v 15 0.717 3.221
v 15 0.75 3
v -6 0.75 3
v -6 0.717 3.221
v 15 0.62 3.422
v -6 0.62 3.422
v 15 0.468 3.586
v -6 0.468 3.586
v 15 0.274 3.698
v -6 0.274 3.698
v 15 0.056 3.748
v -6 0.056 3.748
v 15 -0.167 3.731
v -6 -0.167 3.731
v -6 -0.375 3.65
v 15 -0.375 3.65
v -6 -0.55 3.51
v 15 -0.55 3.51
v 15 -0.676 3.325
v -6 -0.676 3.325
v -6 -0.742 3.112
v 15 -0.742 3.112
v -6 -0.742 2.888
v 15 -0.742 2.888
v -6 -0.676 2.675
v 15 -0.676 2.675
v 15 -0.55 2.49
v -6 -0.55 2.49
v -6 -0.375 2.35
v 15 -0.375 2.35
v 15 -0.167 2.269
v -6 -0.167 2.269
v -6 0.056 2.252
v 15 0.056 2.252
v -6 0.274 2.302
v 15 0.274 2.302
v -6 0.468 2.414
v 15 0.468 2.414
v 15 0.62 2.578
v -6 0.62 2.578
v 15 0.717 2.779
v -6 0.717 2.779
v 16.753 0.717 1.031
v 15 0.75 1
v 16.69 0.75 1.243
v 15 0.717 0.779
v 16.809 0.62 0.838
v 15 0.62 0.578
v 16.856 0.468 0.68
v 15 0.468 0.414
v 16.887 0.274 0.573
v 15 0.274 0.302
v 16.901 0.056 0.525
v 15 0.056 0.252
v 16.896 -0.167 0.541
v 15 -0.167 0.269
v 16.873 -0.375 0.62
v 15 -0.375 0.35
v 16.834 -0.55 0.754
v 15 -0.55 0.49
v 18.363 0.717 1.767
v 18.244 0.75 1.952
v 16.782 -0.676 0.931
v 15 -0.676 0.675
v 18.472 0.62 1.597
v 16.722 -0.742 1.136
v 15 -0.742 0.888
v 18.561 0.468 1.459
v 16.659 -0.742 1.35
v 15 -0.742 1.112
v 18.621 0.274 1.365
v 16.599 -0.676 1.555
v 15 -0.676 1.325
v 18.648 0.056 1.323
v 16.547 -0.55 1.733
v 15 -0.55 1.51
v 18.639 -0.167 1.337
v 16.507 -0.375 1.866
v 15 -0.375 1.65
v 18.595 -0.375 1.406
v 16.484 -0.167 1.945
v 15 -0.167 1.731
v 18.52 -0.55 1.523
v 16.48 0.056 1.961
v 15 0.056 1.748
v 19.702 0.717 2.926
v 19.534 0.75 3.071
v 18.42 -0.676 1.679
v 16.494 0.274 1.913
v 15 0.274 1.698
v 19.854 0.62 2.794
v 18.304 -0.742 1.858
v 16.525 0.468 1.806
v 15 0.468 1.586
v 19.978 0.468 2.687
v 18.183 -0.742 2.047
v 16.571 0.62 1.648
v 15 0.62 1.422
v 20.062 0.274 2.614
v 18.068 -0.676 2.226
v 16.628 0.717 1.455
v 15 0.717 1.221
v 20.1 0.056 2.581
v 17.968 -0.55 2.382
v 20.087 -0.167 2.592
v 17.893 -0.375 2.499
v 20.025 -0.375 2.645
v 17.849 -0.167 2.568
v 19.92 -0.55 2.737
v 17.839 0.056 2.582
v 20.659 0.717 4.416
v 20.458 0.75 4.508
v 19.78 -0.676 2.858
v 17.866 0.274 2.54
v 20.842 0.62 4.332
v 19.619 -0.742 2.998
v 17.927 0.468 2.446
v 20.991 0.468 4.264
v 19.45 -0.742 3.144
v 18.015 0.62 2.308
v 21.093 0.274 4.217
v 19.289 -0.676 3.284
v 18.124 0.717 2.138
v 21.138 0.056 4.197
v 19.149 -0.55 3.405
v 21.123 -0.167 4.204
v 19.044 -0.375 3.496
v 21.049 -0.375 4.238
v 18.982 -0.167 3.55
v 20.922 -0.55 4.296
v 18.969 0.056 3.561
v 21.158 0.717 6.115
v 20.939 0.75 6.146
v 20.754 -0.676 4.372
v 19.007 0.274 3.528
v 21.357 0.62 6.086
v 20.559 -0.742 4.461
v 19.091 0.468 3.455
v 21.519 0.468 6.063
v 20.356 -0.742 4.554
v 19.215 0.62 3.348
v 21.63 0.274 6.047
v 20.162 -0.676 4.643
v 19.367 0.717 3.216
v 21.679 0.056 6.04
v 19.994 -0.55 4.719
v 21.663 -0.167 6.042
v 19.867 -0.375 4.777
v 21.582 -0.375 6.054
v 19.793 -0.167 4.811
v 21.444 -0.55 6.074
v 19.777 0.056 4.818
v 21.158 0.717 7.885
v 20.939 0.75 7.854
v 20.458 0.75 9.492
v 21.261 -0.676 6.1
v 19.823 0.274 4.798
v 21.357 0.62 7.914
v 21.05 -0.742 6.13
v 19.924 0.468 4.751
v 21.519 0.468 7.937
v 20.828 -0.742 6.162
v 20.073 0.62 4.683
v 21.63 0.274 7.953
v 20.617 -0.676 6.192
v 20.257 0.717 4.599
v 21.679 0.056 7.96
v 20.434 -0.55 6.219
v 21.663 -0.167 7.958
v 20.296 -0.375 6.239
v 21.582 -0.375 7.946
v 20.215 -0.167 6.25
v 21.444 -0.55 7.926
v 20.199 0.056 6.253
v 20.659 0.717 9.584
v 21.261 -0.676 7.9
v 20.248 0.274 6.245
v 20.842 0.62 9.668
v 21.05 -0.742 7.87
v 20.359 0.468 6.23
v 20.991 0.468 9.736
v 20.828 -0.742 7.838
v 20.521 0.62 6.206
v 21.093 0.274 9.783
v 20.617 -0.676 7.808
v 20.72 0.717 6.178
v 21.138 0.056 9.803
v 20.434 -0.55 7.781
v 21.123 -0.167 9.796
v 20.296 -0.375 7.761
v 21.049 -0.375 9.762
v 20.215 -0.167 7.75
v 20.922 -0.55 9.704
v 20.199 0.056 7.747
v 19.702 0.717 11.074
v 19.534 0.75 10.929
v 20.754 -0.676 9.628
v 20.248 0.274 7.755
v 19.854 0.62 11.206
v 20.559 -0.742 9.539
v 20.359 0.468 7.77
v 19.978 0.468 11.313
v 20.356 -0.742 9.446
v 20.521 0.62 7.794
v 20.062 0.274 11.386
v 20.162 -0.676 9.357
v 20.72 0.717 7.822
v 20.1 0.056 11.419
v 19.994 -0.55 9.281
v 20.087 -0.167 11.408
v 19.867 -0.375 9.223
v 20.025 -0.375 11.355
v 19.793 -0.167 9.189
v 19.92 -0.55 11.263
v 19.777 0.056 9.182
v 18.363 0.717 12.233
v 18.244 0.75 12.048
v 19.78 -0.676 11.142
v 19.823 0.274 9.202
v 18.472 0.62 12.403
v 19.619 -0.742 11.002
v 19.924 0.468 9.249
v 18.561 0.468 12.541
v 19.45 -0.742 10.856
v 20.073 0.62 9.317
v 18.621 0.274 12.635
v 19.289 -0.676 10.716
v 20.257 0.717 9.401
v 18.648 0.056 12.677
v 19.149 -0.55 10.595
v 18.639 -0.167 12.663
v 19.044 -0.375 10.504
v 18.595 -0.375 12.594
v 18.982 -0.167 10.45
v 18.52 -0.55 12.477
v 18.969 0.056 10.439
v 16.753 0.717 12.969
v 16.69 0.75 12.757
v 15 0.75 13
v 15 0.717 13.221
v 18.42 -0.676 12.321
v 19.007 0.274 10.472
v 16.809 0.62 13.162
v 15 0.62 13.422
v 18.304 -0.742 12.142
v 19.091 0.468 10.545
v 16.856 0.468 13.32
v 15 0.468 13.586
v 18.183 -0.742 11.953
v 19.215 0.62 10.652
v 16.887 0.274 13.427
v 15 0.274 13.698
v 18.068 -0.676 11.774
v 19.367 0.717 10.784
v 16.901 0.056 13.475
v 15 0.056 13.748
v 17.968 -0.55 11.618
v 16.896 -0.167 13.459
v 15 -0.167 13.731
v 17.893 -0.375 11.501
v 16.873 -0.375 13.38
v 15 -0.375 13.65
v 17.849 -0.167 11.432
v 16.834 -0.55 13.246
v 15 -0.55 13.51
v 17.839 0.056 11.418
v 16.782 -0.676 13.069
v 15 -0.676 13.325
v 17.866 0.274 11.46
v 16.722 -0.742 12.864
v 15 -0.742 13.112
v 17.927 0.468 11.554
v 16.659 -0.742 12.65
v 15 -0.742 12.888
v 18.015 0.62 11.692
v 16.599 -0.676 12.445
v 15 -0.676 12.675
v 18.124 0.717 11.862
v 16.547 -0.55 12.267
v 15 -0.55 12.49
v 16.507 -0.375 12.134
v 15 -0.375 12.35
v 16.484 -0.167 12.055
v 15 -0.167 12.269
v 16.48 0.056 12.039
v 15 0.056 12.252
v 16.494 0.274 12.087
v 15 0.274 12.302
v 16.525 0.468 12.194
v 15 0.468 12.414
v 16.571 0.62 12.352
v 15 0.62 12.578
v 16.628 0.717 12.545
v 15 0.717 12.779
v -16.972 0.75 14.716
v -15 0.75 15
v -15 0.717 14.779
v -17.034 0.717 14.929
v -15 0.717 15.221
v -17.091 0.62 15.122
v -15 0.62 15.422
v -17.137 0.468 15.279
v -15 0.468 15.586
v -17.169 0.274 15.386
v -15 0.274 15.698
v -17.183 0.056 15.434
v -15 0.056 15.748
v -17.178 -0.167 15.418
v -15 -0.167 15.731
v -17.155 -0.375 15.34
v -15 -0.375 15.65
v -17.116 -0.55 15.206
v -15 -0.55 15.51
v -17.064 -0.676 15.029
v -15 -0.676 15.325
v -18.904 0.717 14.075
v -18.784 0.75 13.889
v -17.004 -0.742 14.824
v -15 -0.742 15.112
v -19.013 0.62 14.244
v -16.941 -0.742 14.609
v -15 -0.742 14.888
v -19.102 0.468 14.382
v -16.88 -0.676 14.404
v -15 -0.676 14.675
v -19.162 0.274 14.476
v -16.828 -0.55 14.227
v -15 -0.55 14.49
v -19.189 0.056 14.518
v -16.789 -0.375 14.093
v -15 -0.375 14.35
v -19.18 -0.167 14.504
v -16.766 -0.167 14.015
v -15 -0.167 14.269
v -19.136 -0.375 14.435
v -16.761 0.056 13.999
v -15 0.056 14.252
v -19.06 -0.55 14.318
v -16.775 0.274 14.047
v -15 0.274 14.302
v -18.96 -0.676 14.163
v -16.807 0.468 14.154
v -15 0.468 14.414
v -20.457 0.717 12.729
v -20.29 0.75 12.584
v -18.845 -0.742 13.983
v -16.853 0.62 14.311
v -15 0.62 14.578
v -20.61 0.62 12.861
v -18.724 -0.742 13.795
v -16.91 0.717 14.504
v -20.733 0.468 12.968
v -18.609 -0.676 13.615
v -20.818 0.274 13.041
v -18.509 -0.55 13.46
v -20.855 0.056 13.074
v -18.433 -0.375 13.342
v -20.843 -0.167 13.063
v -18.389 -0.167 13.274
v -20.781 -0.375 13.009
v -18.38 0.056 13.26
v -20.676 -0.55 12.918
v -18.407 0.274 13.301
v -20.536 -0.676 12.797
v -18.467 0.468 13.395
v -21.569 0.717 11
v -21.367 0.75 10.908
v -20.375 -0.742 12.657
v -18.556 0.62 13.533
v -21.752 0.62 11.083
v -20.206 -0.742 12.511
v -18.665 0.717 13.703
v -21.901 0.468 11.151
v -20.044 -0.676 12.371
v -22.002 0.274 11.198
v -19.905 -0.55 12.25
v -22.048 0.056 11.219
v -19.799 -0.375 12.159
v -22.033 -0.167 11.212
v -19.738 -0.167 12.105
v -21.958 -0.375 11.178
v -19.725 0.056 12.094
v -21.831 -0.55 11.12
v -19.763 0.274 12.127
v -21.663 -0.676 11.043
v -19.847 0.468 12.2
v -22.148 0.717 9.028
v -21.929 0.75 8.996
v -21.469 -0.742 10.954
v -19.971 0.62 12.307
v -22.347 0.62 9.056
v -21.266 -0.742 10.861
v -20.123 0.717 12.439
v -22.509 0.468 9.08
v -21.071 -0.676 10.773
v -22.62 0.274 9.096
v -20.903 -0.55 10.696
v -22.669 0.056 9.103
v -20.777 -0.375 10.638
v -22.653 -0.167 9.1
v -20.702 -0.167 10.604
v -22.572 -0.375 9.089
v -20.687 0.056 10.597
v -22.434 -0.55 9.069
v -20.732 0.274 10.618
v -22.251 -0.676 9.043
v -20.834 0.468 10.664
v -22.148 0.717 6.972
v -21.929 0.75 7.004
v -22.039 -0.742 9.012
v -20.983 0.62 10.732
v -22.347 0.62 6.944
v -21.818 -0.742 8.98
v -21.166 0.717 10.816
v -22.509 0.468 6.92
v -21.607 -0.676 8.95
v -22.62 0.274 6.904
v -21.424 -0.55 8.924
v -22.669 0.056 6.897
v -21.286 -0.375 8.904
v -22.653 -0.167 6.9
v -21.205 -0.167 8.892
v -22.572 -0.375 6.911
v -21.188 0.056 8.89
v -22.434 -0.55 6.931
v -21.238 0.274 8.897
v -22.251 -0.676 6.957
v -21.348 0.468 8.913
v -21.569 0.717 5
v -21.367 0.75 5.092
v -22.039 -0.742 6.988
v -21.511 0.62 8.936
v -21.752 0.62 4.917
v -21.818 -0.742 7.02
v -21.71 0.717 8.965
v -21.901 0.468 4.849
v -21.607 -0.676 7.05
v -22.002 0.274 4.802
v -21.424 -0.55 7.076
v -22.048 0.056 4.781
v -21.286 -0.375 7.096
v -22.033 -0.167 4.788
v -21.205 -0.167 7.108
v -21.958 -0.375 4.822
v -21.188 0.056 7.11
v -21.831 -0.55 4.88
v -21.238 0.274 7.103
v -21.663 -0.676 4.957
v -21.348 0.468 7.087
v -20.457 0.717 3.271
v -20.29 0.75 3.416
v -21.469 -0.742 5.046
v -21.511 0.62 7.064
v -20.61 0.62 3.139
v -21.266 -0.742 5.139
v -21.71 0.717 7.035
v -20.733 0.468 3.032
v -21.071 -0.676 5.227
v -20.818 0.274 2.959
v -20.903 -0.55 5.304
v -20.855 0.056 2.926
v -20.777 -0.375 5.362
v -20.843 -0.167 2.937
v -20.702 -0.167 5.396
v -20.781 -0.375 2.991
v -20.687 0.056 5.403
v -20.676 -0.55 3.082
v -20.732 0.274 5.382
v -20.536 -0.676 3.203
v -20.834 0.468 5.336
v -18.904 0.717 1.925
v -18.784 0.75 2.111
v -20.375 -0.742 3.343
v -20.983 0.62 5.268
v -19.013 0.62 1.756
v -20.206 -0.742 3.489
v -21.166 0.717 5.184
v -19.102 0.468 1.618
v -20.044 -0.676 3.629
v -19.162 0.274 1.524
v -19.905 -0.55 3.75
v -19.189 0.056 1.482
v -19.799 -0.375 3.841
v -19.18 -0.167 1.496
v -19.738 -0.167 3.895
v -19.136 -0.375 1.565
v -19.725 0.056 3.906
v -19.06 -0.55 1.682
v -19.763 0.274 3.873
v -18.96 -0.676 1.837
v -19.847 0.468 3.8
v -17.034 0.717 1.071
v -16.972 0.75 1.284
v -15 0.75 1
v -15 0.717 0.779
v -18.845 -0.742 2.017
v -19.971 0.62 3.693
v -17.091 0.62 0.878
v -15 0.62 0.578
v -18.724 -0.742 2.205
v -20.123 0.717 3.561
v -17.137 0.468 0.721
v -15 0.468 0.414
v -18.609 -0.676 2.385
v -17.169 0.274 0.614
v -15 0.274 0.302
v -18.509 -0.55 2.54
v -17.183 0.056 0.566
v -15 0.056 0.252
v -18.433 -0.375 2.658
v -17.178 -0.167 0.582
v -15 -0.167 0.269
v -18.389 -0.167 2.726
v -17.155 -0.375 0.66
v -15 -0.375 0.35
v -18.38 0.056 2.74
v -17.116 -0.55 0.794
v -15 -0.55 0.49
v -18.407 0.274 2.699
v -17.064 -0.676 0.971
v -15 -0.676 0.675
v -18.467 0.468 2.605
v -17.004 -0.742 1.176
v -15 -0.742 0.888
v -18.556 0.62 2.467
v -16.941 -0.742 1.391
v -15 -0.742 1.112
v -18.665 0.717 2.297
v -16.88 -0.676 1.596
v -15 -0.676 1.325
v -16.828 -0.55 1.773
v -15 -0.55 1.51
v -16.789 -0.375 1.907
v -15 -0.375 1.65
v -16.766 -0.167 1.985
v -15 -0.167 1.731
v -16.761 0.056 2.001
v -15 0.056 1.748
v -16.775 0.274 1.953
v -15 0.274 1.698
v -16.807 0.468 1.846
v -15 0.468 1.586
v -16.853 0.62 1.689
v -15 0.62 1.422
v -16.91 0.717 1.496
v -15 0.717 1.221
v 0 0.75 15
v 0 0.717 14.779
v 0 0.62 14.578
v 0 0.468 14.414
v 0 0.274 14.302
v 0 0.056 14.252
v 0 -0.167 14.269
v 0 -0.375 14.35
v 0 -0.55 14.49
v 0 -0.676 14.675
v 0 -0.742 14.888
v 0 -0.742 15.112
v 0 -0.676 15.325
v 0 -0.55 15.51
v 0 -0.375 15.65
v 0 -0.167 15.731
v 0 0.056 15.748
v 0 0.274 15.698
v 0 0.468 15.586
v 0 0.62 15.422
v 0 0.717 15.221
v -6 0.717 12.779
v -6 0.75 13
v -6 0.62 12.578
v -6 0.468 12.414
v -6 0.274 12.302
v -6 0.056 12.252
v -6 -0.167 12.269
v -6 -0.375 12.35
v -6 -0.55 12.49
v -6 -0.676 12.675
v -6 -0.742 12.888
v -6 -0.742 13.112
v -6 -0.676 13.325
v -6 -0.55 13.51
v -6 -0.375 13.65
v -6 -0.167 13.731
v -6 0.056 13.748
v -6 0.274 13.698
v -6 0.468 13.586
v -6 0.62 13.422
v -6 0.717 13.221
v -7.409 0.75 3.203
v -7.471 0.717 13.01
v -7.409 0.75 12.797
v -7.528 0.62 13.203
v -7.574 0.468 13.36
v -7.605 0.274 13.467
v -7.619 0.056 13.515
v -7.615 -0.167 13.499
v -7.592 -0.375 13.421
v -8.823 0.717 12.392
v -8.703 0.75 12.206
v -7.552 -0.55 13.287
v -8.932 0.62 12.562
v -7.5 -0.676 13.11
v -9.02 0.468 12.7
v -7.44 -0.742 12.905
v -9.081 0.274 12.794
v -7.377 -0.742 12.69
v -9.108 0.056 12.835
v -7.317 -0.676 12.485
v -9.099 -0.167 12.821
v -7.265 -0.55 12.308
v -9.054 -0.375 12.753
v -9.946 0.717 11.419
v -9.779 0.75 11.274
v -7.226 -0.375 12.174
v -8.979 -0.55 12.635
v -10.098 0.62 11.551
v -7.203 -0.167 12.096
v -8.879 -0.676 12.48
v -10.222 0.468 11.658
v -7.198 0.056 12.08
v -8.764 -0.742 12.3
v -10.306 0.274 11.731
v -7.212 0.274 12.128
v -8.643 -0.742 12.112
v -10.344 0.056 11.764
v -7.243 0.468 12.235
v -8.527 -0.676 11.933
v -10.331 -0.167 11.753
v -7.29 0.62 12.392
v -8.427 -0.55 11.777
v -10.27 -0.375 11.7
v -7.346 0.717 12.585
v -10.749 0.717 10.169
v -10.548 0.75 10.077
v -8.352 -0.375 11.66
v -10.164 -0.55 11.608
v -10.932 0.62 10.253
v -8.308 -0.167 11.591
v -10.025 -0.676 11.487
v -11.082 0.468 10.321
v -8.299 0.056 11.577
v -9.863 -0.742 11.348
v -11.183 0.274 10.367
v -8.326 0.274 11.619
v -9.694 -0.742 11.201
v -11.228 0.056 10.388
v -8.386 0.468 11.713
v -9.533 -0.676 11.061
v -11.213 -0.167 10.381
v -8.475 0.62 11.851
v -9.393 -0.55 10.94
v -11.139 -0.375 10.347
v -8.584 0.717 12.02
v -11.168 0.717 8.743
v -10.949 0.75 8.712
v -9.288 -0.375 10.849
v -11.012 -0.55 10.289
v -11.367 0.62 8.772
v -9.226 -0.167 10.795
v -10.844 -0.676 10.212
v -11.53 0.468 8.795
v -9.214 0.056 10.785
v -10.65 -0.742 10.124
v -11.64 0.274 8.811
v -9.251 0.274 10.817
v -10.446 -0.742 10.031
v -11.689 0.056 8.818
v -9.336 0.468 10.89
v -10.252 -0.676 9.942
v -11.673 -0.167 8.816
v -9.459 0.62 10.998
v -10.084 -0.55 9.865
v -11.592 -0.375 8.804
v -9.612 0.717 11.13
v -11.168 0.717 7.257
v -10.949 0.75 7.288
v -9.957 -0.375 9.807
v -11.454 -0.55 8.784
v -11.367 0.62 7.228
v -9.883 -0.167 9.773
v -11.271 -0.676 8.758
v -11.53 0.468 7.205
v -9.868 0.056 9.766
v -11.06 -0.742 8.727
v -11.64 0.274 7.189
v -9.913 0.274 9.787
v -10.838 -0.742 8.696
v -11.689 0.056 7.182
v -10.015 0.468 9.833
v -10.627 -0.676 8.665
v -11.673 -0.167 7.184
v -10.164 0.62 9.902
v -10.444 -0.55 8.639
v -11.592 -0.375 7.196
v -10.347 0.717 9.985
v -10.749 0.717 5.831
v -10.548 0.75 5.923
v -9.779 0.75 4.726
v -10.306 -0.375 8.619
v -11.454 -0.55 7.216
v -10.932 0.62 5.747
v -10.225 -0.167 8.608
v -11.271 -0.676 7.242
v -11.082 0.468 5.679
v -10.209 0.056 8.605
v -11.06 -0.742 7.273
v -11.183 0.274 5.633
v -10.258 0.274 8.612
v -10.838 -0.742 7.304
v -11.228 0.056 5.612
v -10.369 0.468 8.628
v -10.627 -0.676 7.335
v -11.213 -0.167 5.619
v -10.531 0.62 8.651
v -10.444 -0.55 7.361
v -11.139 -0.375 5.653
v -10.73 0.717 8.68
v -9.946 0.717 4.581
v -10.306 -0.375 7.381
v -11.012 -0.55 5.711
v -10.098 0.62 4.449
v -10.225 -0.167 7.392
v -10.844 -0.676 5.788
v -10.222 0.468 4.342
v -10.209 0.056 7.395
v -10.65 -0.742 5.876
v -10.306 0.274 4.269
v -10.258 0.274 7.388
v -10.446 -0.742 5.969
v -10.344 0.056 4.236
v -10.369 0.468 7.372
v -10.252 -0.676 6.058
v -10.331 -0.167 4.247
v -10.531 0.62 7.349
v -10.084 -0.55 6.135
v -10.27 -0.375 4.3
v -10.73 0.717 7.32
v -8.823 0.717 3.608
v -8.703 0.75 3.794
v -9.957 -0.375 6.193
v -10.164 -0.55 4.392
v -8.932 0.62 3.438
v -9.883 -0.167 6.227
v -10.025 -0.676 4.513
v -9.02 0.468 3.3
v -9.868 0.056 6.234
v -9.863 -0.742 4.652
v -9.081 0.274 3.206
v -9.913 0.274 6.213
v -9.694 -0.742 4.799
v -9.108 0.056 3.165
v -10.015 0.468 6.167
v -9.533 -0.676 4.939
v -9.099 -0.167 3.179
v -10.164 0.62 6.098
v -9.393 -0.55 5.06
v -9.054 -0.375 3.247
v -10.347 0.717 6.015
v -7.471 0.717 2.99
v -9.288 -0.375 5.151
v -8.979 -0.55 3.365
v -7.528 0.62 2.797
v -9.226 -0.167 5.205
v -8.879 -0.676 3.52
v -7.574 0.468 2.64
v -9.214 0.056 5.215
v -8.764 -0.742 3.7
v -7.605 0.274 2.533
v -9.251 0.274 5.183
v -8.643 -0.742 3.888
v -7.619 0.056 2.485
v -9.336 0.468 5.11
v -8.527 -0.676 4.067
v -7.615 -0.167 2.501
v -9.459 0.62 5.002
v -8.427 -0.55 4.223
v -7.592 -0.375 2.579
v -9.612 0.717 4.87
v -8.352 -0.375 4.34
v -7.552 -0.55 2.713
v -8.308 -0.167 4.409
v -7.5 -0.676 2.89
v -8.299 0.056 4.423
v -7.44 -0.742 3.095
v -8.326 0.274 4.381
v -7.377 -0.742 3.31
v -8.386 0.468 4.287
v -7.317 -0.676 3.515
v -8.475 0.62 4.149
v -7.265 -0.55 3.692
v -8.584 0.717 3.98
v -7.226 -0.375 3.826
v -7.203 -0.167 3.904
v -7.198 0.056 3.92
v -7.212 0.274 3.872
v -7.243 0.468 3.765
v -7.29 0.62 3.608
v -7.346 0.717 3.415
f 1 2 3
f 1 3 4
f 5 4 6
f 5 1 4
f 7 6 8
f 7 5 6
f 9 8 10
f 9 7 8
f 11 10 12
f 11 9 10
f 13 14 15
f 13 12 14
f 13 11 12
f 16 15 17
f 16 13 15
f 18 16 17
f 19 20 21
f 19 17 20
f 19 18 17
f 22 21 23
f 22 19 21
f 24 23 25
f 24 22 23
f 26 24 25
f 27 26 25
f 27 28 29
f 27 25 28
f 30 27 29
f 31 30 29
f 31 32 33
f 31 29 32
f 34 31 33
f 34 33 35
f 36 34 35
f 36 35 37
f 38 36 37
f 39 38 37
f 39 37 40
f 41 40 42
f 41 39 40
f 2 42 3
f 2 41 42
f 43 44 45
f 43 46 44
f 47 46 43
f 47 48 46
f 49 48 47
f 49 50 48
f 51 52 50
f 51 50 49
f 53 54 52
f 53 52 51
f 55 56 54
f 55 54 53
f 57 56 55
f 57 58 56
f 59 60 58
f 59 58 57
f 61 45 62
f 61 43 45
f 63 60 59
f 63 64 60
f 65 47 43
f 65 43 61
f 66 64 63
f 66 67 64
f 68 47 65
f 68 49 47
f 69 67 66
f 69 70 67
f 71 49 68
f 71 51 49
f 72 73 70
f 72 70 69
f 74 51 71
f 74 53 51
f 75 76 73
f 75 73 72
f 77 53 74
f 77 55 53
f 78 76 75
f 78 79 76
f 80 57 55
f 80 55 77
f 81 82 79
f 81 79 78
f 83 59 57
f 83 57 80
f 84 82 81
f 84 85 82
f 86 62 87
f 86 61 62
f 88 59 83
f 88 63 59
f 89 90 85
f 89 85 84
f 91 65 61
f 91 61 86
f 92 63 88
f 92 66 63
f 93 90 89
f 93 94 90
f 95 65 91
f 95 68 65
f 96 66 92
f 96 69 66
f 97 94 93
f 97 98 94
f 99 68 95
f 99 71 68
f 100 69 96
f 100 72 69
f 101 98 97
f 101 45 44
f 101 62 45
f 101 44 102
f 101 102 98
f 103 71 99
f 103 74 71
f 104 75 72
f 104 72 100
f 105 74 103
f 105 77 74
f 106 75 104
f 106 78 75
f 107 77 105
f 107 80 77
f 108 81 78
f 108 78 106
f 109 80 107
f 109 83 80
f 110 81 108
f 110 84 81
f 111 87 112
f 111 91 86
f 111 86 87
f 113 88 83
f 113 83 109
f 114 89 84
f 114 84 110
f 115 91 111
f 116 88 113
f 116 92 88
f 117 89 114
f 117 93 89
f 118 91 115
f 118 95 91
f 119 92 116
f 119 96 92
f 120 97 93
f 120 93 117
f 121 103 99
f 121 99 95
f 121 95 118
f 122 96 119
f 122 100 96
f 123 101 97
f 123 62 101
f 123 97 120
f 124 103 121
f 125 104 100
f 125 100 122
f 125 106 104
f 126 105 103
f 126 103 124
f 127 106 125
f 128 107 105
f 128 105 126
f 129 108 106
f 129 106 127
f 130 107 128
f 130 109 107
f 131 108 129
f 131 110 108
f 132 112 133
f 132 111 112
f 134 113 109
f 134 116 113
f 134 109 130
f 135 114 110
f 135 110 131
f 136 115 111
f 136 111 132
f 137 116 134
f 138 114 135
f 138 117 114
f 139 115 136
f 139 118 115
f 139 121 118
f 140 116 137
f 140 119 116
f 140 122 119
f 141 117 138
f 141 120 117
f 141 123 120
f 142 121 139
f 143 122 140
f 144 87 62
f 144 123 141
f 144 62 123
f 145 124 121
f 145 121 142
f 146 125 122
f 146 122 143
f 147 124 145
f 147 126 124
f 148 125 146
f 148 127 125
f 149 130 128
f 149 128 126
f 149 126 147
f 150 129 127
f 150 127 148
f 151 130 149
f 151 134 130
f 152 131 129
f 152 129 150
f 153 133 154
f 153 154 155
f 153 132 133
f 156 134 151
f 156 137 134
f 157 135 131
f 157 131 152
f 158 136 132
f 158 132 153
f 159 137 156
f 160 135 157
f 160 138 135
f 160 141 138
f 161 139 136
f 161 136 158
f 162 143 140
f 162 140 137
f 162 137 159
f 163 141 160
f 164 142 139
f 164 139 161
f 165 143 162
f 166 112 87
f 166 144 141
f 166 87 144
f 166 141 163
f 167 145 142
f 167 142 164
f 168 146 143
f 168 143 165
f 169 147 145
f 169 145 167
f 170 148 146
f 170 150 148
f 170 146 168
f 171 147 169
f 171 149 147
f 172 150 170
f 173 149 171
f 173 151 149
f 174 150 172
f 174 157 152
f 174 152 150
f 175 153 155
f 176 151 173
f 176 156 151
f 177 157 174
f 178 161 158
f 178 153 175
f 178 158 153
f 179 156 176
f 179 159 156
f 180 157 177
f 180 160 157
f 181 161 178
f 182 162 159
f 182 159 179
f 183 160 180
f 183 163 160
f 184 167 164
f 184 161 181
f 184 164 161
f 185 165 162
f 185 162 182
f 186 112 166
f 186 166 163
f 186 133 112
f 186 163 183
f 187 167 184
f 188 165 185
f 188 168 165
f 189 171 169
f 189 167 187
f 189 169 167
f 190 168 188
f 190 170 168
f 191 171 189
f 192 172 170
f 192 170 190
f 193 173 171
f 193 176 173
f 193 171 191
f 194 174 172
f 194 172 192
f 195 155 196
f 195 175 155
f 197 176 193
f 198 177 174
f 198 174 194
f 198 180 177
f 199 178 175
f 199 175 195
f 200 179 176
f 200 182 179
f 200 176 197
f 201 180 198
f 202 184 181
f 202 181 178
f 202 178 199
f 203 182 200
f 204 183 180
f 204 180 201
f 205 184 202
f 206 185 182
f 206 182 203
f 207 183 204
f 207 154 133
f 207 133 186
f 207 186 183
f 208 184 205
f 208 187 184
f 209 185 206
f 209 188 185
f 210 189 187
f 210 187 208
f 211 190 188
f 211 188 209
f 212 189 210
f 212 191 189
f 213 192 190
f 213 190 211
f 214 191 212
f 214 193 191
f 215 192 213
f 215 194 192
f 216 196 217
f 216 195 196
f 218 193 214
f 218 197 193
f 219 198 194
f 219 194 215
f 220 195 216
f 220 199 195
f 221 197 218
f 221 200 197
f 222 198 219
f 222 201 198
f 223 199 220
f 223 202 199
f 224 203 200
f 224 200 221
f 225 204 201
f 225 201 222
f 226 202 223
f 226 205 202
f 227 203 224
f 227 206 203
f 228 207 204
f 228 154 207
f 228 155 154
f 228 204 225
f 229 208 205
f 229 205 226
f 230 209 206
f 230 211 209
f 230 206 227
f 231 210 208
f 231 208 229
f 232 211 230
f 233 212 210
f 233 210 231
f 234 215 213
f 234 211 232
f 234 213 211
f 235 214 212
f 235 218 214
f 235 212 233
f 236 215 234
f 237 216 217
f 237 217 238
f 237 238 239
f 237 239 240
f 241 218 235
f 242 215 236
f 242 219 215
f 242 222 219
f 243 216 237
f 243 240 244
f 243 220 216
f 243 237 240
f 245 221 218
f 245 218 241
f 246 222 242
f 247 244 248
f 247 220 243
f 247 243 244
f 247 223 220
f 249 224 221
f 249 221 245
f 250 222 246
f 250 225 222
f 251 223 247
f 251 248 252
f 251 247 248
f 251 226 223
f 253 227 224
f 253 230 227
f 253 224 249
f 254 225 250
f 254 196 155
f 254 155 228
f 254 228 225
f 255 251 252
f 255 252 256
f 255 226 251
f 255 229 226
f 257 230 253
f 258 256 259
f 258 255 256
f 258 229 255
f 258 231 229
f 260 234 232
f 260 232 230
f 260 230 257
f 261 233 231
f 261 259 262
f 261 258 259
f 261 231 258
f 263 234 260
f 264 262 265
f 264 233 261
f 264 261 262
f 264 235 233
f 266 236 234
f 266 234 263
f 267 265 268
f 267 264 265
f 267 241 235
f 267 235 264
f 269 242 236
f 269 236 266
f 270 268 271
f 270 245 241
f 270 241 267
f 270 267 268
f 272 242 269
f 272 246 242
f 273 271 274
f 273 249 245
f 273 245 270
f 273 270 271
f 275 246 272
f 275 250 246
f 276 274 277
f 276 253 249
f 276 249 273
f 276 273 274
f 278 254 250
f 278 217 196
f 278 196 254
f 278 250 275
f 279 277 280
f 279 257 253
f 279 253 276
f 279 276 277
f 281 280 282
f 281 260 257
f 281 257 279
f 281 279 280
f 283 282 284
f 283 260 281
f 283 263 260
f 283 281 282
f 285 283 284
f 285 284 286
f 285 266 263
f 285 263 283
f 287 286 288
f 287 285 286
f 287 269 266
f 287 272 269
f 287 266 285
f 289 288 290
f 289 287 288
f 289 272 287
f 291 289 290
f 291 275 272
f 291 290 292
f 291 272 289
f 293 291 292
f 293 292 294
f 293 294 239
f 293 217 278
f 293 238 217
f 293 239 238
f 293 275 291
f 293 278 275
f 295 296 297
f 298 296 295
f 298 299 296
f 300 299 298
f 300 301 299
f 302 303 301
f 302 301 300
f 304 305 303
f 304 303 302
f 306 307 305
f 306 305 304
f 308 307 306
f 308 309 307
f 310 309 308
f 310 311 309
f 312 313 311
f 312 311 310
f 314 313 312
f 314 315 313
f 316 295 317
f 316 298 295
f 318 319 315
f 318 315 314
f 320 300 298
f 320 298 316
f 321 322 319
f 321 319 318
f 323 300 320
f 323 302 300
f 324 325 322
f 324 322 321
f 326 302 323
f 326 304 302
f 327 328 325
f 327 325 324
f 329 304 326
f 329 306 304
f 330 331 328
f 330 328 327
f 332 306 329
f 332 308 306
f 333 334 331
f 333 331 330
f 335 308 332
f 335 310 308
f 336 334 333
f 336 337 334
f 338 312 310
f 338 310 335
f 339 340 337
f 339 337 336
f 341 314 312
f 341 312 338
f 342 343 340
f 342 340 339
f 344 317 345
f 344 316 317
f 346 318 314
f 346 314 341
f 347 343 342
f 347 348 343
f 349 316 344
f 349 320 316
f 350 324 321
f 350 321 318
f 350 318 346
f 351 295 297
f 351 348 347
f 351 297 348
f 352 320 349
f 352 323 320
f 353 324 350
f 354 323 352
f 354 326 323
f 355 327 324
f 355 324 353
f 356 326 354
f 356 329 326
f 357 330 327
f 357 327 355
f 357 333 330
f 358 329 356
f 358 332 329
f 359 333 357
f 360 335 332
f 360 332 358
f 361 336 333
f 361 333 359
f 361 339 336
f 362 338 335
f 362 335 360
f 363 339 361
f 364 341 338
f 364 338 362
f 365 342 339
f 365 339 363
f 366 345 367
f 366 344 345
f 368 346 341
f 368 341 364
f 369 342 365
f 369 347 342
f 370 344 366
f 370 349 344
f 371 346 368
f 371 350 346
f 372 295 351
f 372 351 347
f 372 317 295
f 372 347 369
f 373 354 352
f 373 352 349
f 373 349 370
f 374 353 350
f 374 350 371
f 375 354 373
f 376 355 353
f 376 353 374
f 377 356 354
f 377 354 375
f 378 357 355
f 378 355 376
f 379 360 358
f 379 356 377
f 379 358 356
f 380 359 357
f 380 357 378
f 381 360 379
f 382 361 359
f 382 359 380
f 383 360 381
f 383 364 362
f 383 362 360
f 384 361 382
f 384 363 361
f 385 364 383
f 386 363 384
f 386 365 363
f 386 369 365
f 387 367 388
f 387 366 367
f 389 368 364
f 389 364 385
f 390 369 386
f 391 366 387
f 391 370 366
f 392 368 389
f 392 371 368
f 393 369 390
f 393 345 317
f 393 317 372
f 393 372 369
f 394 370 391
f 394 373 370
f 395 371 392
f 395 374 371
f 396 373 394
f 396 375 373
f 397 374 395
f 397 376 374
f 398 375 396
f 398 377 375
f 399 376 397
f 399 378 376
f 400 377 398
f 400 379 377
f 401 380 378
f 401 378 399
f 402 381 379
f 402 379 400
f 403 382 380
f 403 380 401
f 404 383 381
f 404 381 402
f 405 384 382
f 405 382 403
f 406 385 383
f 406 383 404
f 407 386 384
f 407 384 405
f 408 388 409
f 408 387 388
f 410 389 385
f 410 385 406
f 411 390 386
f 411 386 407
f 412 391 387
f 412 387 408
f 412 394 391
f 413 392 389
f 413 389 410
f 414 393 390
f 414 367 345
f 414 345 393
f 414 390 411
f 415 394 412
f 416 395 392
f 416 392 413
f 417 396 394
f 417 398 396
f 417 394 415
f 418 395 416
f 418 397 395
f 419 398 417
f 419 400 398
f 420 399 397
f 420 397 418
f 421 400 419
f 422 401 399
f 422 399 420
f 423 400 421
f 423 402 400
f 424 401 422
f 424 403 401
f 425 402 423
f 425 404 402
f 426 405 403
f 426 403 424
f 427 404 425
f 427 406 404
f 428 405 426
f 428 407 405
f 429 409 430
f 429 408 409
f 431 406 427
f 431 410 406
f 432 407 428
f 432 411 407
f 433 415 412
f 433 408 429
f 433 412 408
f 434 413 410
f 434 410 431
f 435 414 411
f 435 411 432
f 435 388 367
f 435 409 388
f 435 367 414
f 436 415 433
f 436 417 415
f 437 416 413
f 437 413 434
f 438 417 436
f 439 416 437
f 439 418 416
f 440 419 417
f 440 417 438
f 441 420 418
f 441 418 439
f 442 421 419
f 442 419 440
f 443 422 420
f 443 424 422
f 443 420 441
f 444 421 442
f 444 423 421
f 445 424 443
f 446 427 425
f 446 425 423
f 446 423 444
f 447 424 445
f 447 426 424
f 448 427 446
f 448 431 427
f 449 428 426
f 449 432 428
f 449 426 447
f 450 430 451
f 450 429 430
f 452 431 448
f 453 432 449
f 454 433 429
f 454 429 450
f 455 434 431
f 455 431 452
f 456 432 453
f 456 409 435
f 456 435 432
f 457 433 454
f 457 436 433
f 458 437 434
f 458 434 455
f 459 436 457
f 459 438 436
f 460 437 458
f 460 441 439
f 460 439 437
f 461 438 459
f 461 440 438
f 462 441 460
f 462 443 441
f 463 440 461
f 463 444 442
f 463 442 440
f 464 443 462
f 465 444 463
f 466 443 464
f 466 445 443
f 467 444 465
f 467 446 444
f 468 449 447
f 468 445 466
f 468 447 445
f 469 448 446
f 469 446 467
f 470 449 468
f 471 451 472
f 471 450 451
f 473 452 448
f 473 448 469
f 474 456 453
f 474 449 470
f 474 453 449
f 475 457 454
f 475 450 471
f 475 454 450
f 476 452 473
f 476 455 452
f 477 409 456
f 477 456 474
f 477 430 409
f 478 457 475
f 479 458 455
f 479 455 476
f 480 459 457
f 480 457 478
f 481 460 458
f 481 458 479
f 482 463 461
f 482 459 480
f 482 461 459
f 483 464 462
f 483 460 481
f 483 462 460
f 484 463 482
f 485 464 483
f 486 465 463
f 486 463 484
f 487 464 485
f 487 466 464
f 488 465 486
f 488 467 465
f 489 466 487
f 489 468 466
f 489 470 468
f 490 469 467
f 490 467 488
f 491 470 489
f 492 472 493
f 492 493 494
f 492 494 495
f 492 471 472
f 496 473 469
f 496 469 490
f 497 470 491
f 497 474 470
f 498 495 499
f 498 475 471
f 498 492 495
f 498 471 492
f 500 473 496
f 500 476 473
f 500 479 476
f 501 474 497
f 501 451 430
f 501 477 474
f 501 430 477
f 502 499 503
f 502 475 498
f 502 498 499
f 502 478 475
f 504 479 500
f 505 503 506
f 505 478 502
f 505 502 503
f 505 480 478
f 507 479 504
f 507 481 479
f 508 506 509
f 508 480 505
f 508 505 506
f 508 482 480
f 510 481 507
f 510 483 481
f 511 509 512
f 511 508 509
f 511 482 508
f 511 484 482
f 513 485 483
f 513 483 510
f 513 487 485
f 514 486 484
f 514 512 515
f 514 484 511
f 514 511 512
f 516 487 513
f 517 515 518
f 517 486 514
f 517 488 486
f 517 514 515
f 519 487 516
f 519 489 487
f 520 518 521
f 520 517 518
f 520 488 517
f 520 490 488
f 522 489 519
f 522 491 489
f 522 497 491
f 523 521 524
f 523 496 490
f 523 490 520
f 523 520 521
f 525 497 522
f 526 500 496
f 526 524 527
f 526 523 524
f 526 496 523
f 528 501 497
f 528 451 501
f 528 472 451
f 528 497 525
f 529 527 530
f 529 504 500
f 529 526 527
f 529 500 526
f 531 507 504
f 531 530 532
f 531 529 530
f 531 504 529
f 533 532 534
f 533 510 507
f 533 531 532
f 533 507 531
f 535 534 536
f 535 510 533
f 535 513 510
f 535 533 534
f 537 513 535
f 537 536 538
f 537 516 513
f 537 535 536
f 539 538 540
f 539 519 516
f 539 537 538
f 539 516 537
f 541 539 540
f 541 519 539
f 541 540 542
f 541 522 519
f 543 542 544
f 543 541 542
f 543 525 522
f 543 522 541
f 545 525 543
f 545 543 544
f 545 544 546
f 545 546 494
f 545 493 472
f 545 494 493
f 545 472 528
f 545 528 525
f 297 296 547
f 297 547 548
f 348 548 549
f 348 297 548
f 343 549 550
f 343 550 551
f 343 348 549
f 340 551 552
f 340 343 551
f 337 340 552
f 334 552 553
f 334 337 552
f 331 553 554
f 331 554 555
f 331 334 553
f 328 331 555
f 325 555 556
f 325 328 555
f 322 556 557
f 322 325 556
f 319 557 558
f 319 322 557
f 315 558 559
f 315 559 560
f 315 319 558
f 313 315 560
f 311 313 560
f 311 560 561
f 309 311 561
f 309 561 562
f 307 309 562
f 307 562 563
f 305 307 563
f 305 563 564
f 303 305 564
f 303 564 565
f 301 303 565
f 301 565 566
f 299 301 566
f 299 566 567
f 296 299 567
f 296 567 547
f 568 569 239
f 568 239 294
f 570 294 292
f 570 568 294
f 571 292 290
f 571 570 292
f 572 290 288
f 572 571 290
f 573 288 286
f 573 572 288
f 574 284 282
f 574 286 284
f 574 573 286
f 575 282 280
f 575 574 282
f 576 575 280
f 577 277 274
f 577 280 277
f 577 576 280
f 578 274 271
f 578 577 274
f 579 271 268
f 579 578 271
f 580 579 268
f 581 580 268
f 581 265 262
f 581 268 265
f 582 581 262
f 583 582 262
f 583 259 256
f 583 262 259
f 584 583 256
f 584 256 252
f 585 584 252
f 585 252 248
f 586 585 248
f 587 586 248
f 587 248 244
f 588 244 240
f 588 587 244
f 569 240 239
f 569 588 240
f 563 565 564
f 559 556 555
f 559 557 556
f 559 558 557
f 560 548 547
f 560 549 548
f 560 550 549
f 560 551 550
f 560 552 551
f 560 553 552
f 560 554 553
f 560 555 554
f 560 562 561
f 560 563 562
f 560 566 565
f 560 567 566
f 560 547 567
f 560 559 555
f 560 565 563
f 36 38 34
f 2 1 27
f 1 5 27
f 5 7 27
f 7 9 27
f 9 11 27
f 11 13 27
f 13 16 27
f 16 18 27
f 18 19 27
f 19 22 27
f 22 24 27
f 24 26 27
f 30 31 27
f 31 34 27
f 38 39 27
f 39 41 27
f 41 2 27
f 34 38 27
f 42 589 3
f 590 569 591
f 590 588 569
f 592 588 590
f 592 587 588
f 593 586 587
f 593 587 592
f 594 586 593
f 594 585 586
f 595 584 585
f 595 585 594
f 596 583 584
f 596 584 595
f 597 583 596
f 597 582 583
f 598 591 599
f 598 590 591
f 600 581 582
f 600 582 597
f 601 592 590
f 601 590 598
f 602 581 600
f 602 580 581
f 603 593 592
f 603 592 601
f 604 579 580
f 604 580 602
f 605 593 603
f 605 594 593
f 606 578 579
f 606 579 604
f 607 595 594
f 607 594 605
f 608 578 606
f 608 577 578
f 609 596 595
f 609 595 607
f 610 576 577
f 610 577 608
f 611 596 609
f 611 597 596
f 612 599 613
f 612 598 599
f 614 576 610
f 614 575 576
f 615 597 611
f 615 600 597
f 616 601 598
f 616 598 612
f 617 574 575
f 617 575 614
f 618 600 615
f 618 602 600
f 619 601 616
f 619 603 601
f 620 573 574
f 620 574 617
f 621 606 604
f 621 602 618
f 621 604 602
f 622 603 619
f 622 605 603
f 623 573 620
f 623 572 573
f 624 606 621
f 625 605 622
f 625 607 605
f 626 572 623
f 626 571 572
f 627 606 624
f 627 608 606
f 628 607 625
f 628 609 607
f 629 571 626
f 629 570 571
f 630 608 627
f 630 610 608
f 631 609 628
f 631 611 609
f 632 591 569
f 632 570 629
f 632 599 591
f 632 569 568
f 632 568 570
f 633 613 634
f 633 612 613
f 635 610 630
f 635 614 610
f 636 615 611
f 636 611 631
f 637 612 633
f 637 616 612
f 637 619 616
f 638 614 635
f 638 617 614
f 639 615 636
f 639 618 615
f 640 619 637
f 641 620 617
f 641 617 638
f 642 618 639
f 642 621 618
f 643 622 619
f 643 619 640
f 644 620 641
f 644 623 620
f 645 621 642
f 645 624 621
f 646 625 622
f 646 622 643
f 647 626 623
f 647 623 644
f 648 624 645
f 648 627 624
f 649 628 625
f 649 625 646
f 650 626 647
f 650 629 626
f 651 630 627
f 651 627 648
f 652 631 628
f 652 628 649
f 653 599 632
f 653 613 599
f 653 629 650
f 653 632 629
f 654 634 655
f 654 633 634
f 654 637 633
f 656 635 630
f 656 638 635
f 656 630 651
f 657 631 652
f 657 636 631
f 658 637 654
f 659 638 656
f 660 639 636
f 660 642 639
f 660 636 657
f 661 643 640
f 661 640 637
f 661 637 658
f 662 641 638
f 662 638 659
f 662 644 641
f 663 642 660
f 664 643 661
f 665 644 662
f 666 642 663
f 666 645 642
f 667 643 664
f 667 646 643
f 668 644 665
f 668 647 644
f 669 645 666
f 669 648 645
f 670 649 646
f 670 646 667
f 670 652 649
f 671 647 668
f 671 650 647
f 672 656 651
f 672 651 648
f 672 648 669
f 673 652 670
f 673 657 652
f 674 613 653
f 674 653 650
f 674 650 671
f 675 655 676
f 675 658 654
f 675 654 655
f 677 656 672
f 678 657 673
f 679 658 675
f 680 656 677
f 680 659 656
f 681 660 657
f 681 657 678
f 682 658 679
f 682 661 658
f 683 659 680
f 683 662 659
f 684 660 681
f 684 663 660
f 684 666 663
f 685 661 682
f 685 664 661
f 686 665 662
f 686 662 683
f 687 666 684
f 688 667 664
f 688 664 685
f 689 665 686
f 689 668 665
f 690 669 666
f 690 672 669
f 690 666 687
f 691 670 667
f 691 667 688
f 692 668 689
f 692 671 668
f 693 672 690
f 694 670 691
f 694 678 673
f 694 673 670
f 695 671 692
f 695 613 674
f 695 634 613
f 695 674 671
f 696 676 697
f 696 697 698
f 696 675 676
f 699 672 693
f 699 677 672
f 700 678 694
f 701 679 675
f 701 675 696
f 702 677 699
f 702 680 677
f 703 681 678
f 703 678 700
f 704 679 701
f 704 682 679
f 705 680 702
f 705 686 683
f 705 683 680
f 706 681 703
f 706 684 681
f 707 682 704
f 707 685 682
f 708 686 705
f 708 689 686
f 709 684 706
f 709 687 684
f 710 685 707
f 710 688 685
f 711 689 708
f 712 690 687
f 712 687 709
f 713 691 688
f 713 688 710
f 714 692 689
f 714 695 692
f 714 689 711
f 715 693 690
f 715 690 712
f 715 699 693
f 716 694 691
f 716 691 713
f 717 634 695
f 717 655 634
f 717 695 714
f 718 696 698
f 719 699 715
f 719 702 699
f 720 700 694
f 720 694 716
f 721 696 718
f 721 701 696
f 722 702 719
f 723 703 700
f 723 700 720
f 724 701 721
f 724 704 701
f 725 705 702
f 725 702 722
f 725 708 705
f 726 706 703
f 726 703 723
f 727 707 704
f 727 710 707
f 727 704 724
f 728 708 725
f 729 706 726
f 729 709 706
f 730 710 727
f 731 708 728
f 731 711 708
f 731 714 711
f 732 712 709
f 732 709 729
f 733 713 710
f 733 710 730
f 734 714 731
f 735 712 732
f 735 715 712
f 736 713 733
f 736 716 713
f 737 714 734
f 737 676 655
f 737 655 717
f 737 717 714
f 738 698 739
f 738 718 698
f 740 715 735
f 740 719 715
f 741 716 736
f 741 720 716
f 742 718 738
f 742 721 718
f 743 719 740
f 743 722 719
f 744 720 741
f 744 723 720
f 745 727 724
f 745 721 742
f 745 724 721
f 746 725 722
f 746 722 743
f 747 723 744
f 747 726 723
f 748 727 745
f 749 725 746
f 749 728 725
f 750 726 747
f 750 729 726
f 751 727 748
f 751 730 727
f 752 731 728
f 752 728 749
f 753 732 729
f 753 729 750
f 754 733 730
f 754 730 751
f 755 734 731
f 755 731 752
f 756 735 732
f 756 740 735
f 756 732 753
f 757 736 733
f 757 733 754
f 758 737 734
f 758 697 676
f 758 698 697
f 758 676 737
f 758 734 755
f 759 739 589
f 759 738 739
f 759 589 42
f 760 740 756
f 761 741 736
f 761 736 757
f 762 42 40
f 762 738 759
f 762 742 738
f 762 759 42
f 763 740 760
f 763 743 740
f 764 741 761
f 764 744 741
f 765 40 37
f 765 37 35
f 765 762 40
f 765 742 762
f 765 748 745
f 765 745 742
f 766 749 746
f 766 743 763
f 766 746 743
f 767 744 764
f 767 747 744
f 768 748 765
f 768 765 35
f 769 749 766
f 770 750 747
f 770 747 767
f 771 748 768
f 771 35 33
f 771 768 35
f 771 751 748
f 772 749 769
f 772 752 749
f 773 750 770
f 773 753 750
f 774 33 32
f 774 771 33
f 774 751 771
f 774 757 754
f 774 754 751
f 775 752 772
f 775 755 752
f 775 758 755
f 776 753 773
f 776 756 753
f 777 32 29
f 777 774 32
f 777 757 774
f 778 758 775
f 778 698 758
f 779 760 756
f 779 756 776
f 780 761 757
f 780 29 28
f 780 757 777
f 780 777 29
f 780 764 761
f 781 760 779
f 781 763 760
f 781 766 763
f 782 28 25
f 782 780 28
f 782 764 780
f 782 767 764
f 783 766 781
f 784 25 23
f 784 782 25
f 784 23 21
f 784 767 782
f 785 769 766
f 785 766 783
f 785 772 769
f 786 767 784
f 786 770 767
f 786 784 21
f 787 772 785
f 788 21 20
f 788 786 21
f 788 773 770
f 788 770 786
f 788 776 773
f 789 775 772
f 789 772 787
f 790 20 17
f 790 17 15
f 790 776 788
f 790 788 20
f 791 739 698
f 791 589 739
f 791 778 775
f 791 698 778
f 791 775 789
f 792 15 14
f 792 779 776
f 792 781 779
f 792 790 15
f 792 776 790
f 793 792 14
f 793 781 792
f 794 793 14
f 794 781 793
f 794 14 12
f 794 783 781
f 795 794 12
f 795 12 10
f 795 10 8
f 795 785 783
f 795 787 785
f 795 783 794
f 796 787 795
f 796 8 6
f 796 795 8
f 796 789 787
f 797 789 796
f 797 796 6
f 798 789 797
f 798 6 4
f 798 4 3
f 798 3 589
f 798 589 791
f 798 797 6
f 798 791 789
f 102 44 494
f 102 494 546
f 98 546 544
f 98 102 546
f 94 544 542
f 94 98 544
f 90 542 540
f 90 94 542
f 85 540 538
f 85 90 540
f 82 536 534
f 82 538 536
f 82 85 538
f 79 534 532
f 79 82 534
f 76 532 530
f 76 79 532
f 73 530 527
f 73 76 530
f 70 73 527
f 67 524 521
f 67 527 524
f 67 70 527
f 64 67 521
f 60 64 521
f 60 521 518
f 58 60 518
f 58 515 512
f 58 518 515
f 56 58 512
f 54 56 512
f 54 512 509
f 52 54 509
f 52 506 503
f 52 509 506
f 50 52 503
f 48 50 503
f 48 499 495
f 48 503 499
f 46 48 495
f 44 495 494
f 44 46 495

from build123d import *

# Parameters (mm, degrees)
F1_R = 0.75


with BuildPart() as f2:
    # F2: sweep along a path in F0
    with BuildLine(Plane.XZ) as f2_path:
        Line((0, 15), (-15, 15))
        ThreePointArc((-15, 15), (-22, 8), (-15, 1))
        Line((-15, 1), (15, 1))
        ThreePointArc((15, 1), (21, 7), (15, 13))
        Line((15, 13), (-6, 13))
        ThreePointArc((-6, 13), (-11, 8), (-6, 3))
        Line((-6, 3), (15, 3))
    # F1 (on Right) → F2 (sweep)
    with BuildSketch(Plane.YZ):
        with Locations((0, 15)):
            Circle(F1_R)
    sweep(path=f2_path.line)


solid = f2.part
